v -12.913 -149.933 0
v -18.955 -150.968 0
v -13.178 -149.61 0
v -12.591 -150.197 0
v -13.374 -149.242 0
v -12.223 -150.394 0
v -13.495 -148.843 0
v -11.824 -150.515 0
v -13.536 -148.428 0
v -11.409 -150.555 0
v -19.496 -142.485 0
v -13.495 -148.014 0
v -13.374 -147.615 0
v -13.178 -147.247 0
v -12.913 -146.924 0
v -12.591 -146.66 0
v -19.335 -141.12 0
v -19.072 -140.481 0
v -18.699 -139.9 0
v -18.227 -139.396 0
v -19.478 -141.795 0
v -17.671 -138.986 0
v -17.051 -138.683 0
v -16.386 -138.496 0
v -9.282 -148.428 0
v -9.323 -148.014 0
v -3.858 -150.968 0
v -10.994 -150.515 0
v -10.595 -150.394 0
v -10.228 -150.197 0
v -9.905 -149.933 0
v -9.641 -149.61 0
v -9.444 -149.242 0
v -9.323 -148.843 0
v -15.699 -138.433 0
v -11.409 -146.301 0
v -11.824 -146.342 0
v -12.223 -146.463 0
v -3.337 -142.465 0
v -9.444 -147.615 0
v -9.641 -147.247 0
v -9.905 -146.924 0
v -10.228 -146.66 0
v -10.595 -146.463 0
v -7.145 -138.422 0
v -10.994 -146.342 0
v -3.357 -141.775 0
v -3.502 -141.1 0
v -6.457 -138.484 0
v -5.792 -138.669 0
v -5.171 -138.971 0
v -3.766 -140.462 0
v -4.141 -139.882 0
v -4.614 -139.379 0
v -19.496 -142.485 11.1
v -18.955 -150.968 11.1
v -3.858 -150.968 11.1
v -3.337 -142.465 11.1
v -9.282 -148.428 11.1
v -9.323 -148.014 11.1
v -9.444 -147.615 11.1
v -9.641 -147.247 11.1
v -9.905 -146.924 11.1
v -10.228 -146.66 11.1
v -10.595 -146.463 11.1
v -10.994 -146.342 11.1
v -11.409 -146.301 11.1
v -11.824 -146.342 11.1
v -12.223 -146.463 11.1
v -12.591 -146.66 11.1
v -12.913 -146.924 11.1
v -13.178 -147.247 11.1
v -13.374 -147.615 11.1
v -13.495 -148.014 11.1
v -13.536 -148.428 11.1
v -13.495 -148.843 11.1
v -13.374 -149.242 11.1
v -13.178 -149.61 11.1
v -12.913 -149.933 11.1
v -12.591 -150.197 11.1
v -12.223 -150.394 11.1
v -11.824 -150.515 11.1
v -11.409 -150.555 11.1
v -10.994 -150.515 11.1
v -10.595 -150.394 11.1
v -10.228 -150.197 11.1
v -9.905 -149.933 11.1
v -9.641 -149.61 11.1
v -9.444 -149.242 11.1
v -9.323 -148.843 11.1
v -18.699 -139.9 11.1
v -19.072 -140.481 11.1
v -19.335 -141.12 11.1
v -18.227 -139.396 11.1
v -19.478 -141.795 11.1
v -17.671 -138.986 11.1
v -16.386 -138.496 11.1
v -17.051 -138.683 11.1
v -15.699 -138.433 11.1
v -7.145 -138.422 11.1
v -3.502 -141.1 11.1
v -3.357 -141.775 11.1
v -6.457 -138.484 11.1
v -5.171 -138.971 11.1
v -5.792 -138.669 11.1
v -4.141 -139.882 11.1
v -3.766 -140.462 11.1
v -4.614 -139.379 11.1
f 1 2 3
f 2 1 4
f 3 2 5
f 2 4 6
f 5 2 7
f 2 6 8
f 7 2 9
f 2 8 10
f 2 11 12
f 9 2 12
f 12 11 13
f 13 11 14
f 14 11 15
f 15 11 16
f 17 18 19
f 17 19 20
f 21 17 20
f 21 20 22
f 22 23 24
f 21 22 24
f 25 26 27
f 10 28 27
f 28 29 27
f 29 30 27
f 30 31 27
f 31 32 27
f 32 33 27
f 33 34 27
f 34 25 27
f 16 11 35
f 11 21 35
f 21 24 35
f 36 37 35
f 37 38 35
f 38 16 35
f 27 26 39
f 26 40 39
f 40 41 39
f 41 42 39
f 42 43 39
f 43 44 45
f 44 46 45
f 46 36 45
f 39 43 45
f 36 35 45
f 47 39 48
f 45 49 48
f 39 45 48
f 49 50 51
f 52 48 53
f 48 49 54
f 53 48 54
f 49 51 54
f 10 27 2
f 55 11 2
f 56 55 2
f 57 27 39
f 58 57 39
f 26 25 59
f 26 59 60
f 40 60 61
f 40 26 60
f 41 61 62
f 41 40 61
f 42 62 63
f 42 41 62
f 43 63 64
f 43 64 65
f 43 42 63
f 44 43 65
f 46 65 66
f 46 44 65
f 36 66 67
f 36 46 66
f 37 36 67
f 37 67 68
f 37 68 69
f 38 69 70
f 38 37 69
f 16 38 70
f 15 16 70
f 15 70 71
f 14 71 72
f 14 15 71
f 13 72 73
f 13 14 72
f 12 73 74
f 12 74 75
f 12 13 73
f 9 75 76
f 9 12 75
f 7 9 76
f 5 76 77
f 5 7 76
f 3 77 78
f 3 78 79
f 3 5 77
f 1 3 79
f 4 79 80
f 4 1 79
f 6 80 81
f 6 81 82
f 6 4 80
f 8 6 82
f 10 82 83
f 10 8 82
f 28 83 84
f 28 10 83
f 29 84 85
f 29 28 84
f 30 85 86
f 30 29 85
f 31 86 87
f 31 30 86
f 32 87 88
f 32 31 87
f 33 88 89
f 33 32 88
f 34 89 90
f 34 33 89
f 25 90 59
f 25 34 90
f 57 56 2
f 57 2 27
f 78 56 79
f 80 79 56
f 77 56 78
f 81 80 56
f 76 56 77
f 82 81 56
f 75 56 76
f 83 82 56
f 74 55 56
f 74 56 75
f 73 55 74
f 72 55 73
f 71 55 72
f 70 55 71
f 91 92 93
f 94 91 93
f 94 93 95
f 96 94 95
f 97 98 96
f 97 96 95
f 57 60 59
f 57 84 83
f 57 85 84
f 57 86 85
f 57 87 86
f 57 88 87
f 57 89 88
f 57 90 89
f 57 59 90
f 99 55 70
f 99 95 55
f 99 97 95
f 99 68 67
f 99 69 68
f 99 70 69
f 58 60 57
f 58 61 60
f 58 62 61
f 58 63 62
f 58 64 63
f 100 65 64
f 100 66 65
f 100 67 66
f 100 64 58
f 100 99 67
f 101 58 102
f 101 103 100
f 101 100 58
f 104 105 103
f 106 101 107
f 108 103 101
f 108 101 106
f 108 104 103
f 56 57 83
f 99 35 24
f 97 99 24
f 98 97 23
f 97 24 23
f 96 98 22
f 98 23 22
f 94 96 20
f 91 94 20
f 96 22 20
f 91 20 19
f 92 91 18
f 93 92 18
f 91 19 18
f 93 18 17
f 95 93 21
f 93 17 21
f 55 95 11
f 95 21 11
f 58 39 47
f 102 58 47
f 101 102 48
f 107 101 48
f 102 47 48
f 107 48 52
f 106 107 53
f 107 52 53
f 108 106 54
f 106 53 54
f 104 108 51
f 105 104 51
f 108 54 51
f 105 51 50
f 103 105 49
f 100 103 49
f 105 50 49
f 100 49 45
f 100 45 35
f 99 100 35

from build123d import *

# Parameters (mm, degrees)
SKETCH2_R           = 2.127
BOSS_EXTRUDE1_DEPTH = 11.0998
SKETCH3_W           = 24.110565092
SKETCH3_H           = 30.85676152
CUT_EXTRUDE1_DEPTH  = 11.0998


with BuildPart() as part:
    # Sketch2 → Boss-Extrude1 (new body)
    with BuildSketch(Plane.XY):
        with BuildLine():
            Line((-5.032244852, -170.140769418), (-3.337033957, -142.465103356))
            ThreePointArc((-3.337033957, -142.465103356), (-4.366318267, -139.620020754), (-7.144640499, -138.422169855))
            Line((-7.144640499, -138.422169855), (-15.698665552, -138.4327981))
            ThreePointArc((-15.698665552, -138.4327981), (-18.474002587, -139.637549336), (-19.496213787, -142.48518089))
            Line((-19.496213787, -142.48518089), (-17.732235049, -170.156548962))
            ThreePointArc((-17.732235049, -170.156548962), (-11.374511927, -176.368472831), (-5.032244852, -170.140769418))
        make_face()
        with Locations((-11.409226923, -148.428494397)):
            Circle(SKETCH2_R, mode=Mode.SUBTRACT)
        with Locations((-11.380823745, -171.288476752)):
            Circle(SKETCH2_R, mode=Mode.SUBTRACT)
    extrude(amount=BOSS_EXTRUDE1_DEPTH)

    # Sketch3 → Cut-Extrude1 (cut)
    with BuildSketch(Plane.XY.offset(11.0998)):
        with Locations((-9.740364604, -166.396875157)):
            Rectangle(SKETCH3_W, SKETCH3_H)
    extrude(amount=-CUT_EXTRUDE1_DEPTH, mode=Mode.SUBTRACT)


solid = part.part
